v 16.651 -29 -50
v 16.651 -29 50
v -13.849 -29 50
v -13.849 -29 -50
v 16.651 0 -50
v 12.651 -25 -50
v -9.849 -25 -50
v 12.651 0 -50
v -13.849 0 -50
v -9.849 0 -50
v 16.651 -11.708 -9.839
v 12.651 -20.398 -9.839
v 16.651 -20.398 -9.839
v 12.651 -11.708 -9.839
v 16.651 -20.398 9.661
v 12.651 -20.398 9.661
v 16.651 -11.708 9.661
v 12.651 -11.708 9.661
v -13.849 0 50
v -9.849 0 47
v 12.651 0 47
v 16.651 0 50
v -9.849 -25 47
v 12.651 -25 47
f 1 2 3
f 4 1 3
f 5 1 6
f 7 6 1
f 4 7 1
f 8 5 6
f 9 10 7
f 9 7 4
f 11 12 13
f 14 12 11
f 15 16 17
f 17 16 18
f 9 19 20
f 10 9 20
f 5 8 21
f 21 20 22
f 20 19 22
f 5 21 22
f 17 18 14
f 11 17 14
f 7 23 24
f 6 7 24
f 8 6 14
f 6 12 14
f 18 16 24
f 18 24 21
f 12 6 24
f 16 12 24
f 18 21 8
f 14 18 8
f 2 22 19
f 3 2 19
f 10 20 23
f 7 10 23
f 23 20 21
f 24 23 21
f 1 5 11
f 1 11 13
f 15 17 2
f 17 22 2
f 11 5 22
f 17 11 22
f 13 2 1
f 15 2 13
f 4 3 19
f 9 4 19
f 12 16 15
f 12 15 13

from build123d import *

# Parameters (mm, degrees)
BOSS_EXTRUDE1_DEPTH = 50
SKETCH2_W           = 30.5
SKETCH2_H           = 29
BOSS_EXTRUDE2_DEPTH = 3
SKETCH3_W           = 19.5
SKETCH3_H           = 8.69
CUT_EXTRUDE1_DEPTH  = 30


with BuildPart() as part:
    # Sketch1 → Boss-Extrude1 (new body, symmetric)
    with BuildSketch(Plane.XY):
        Polygon((-9.848648649, 0), (-9.848648649, -25), (12.651351351, -25), (12.651351351, 0), (16.651351351, 0), (16.651351351, -29), (-13.848648649, -29), (-13.848648649, 0), align=None)
    extrude(amount=BOSS_EXTRUDE1_DEPTH, both=True)

    # Sketch2 → Boss-Extrude2 (add)
    with BuildSketch(Plane.XY.offset(50)):
        with Locations((1.401351351, -14.5)):
            Rectangle(SKETCH2_W, SKETCH2_H)
    extrude(amount=-BOSS_EXTRUDE2_DEPTH)

    # Sketch3 → Cut-Extrude1 (cut)
    with BuildSketch(Plane(origin=(0, 0, 0), x_dir=(0, 0, -1), z_dir=(1, 0, 0))):
        with Locations((0.088778278, -16.052995557)):
            Rectangle(SKETCH3_W, SKETCH3_H)
    extrude(amount=CUT_EXTRUDE1_DEPTH, mode=Mode.SUBTRACT)


solid = part.part
